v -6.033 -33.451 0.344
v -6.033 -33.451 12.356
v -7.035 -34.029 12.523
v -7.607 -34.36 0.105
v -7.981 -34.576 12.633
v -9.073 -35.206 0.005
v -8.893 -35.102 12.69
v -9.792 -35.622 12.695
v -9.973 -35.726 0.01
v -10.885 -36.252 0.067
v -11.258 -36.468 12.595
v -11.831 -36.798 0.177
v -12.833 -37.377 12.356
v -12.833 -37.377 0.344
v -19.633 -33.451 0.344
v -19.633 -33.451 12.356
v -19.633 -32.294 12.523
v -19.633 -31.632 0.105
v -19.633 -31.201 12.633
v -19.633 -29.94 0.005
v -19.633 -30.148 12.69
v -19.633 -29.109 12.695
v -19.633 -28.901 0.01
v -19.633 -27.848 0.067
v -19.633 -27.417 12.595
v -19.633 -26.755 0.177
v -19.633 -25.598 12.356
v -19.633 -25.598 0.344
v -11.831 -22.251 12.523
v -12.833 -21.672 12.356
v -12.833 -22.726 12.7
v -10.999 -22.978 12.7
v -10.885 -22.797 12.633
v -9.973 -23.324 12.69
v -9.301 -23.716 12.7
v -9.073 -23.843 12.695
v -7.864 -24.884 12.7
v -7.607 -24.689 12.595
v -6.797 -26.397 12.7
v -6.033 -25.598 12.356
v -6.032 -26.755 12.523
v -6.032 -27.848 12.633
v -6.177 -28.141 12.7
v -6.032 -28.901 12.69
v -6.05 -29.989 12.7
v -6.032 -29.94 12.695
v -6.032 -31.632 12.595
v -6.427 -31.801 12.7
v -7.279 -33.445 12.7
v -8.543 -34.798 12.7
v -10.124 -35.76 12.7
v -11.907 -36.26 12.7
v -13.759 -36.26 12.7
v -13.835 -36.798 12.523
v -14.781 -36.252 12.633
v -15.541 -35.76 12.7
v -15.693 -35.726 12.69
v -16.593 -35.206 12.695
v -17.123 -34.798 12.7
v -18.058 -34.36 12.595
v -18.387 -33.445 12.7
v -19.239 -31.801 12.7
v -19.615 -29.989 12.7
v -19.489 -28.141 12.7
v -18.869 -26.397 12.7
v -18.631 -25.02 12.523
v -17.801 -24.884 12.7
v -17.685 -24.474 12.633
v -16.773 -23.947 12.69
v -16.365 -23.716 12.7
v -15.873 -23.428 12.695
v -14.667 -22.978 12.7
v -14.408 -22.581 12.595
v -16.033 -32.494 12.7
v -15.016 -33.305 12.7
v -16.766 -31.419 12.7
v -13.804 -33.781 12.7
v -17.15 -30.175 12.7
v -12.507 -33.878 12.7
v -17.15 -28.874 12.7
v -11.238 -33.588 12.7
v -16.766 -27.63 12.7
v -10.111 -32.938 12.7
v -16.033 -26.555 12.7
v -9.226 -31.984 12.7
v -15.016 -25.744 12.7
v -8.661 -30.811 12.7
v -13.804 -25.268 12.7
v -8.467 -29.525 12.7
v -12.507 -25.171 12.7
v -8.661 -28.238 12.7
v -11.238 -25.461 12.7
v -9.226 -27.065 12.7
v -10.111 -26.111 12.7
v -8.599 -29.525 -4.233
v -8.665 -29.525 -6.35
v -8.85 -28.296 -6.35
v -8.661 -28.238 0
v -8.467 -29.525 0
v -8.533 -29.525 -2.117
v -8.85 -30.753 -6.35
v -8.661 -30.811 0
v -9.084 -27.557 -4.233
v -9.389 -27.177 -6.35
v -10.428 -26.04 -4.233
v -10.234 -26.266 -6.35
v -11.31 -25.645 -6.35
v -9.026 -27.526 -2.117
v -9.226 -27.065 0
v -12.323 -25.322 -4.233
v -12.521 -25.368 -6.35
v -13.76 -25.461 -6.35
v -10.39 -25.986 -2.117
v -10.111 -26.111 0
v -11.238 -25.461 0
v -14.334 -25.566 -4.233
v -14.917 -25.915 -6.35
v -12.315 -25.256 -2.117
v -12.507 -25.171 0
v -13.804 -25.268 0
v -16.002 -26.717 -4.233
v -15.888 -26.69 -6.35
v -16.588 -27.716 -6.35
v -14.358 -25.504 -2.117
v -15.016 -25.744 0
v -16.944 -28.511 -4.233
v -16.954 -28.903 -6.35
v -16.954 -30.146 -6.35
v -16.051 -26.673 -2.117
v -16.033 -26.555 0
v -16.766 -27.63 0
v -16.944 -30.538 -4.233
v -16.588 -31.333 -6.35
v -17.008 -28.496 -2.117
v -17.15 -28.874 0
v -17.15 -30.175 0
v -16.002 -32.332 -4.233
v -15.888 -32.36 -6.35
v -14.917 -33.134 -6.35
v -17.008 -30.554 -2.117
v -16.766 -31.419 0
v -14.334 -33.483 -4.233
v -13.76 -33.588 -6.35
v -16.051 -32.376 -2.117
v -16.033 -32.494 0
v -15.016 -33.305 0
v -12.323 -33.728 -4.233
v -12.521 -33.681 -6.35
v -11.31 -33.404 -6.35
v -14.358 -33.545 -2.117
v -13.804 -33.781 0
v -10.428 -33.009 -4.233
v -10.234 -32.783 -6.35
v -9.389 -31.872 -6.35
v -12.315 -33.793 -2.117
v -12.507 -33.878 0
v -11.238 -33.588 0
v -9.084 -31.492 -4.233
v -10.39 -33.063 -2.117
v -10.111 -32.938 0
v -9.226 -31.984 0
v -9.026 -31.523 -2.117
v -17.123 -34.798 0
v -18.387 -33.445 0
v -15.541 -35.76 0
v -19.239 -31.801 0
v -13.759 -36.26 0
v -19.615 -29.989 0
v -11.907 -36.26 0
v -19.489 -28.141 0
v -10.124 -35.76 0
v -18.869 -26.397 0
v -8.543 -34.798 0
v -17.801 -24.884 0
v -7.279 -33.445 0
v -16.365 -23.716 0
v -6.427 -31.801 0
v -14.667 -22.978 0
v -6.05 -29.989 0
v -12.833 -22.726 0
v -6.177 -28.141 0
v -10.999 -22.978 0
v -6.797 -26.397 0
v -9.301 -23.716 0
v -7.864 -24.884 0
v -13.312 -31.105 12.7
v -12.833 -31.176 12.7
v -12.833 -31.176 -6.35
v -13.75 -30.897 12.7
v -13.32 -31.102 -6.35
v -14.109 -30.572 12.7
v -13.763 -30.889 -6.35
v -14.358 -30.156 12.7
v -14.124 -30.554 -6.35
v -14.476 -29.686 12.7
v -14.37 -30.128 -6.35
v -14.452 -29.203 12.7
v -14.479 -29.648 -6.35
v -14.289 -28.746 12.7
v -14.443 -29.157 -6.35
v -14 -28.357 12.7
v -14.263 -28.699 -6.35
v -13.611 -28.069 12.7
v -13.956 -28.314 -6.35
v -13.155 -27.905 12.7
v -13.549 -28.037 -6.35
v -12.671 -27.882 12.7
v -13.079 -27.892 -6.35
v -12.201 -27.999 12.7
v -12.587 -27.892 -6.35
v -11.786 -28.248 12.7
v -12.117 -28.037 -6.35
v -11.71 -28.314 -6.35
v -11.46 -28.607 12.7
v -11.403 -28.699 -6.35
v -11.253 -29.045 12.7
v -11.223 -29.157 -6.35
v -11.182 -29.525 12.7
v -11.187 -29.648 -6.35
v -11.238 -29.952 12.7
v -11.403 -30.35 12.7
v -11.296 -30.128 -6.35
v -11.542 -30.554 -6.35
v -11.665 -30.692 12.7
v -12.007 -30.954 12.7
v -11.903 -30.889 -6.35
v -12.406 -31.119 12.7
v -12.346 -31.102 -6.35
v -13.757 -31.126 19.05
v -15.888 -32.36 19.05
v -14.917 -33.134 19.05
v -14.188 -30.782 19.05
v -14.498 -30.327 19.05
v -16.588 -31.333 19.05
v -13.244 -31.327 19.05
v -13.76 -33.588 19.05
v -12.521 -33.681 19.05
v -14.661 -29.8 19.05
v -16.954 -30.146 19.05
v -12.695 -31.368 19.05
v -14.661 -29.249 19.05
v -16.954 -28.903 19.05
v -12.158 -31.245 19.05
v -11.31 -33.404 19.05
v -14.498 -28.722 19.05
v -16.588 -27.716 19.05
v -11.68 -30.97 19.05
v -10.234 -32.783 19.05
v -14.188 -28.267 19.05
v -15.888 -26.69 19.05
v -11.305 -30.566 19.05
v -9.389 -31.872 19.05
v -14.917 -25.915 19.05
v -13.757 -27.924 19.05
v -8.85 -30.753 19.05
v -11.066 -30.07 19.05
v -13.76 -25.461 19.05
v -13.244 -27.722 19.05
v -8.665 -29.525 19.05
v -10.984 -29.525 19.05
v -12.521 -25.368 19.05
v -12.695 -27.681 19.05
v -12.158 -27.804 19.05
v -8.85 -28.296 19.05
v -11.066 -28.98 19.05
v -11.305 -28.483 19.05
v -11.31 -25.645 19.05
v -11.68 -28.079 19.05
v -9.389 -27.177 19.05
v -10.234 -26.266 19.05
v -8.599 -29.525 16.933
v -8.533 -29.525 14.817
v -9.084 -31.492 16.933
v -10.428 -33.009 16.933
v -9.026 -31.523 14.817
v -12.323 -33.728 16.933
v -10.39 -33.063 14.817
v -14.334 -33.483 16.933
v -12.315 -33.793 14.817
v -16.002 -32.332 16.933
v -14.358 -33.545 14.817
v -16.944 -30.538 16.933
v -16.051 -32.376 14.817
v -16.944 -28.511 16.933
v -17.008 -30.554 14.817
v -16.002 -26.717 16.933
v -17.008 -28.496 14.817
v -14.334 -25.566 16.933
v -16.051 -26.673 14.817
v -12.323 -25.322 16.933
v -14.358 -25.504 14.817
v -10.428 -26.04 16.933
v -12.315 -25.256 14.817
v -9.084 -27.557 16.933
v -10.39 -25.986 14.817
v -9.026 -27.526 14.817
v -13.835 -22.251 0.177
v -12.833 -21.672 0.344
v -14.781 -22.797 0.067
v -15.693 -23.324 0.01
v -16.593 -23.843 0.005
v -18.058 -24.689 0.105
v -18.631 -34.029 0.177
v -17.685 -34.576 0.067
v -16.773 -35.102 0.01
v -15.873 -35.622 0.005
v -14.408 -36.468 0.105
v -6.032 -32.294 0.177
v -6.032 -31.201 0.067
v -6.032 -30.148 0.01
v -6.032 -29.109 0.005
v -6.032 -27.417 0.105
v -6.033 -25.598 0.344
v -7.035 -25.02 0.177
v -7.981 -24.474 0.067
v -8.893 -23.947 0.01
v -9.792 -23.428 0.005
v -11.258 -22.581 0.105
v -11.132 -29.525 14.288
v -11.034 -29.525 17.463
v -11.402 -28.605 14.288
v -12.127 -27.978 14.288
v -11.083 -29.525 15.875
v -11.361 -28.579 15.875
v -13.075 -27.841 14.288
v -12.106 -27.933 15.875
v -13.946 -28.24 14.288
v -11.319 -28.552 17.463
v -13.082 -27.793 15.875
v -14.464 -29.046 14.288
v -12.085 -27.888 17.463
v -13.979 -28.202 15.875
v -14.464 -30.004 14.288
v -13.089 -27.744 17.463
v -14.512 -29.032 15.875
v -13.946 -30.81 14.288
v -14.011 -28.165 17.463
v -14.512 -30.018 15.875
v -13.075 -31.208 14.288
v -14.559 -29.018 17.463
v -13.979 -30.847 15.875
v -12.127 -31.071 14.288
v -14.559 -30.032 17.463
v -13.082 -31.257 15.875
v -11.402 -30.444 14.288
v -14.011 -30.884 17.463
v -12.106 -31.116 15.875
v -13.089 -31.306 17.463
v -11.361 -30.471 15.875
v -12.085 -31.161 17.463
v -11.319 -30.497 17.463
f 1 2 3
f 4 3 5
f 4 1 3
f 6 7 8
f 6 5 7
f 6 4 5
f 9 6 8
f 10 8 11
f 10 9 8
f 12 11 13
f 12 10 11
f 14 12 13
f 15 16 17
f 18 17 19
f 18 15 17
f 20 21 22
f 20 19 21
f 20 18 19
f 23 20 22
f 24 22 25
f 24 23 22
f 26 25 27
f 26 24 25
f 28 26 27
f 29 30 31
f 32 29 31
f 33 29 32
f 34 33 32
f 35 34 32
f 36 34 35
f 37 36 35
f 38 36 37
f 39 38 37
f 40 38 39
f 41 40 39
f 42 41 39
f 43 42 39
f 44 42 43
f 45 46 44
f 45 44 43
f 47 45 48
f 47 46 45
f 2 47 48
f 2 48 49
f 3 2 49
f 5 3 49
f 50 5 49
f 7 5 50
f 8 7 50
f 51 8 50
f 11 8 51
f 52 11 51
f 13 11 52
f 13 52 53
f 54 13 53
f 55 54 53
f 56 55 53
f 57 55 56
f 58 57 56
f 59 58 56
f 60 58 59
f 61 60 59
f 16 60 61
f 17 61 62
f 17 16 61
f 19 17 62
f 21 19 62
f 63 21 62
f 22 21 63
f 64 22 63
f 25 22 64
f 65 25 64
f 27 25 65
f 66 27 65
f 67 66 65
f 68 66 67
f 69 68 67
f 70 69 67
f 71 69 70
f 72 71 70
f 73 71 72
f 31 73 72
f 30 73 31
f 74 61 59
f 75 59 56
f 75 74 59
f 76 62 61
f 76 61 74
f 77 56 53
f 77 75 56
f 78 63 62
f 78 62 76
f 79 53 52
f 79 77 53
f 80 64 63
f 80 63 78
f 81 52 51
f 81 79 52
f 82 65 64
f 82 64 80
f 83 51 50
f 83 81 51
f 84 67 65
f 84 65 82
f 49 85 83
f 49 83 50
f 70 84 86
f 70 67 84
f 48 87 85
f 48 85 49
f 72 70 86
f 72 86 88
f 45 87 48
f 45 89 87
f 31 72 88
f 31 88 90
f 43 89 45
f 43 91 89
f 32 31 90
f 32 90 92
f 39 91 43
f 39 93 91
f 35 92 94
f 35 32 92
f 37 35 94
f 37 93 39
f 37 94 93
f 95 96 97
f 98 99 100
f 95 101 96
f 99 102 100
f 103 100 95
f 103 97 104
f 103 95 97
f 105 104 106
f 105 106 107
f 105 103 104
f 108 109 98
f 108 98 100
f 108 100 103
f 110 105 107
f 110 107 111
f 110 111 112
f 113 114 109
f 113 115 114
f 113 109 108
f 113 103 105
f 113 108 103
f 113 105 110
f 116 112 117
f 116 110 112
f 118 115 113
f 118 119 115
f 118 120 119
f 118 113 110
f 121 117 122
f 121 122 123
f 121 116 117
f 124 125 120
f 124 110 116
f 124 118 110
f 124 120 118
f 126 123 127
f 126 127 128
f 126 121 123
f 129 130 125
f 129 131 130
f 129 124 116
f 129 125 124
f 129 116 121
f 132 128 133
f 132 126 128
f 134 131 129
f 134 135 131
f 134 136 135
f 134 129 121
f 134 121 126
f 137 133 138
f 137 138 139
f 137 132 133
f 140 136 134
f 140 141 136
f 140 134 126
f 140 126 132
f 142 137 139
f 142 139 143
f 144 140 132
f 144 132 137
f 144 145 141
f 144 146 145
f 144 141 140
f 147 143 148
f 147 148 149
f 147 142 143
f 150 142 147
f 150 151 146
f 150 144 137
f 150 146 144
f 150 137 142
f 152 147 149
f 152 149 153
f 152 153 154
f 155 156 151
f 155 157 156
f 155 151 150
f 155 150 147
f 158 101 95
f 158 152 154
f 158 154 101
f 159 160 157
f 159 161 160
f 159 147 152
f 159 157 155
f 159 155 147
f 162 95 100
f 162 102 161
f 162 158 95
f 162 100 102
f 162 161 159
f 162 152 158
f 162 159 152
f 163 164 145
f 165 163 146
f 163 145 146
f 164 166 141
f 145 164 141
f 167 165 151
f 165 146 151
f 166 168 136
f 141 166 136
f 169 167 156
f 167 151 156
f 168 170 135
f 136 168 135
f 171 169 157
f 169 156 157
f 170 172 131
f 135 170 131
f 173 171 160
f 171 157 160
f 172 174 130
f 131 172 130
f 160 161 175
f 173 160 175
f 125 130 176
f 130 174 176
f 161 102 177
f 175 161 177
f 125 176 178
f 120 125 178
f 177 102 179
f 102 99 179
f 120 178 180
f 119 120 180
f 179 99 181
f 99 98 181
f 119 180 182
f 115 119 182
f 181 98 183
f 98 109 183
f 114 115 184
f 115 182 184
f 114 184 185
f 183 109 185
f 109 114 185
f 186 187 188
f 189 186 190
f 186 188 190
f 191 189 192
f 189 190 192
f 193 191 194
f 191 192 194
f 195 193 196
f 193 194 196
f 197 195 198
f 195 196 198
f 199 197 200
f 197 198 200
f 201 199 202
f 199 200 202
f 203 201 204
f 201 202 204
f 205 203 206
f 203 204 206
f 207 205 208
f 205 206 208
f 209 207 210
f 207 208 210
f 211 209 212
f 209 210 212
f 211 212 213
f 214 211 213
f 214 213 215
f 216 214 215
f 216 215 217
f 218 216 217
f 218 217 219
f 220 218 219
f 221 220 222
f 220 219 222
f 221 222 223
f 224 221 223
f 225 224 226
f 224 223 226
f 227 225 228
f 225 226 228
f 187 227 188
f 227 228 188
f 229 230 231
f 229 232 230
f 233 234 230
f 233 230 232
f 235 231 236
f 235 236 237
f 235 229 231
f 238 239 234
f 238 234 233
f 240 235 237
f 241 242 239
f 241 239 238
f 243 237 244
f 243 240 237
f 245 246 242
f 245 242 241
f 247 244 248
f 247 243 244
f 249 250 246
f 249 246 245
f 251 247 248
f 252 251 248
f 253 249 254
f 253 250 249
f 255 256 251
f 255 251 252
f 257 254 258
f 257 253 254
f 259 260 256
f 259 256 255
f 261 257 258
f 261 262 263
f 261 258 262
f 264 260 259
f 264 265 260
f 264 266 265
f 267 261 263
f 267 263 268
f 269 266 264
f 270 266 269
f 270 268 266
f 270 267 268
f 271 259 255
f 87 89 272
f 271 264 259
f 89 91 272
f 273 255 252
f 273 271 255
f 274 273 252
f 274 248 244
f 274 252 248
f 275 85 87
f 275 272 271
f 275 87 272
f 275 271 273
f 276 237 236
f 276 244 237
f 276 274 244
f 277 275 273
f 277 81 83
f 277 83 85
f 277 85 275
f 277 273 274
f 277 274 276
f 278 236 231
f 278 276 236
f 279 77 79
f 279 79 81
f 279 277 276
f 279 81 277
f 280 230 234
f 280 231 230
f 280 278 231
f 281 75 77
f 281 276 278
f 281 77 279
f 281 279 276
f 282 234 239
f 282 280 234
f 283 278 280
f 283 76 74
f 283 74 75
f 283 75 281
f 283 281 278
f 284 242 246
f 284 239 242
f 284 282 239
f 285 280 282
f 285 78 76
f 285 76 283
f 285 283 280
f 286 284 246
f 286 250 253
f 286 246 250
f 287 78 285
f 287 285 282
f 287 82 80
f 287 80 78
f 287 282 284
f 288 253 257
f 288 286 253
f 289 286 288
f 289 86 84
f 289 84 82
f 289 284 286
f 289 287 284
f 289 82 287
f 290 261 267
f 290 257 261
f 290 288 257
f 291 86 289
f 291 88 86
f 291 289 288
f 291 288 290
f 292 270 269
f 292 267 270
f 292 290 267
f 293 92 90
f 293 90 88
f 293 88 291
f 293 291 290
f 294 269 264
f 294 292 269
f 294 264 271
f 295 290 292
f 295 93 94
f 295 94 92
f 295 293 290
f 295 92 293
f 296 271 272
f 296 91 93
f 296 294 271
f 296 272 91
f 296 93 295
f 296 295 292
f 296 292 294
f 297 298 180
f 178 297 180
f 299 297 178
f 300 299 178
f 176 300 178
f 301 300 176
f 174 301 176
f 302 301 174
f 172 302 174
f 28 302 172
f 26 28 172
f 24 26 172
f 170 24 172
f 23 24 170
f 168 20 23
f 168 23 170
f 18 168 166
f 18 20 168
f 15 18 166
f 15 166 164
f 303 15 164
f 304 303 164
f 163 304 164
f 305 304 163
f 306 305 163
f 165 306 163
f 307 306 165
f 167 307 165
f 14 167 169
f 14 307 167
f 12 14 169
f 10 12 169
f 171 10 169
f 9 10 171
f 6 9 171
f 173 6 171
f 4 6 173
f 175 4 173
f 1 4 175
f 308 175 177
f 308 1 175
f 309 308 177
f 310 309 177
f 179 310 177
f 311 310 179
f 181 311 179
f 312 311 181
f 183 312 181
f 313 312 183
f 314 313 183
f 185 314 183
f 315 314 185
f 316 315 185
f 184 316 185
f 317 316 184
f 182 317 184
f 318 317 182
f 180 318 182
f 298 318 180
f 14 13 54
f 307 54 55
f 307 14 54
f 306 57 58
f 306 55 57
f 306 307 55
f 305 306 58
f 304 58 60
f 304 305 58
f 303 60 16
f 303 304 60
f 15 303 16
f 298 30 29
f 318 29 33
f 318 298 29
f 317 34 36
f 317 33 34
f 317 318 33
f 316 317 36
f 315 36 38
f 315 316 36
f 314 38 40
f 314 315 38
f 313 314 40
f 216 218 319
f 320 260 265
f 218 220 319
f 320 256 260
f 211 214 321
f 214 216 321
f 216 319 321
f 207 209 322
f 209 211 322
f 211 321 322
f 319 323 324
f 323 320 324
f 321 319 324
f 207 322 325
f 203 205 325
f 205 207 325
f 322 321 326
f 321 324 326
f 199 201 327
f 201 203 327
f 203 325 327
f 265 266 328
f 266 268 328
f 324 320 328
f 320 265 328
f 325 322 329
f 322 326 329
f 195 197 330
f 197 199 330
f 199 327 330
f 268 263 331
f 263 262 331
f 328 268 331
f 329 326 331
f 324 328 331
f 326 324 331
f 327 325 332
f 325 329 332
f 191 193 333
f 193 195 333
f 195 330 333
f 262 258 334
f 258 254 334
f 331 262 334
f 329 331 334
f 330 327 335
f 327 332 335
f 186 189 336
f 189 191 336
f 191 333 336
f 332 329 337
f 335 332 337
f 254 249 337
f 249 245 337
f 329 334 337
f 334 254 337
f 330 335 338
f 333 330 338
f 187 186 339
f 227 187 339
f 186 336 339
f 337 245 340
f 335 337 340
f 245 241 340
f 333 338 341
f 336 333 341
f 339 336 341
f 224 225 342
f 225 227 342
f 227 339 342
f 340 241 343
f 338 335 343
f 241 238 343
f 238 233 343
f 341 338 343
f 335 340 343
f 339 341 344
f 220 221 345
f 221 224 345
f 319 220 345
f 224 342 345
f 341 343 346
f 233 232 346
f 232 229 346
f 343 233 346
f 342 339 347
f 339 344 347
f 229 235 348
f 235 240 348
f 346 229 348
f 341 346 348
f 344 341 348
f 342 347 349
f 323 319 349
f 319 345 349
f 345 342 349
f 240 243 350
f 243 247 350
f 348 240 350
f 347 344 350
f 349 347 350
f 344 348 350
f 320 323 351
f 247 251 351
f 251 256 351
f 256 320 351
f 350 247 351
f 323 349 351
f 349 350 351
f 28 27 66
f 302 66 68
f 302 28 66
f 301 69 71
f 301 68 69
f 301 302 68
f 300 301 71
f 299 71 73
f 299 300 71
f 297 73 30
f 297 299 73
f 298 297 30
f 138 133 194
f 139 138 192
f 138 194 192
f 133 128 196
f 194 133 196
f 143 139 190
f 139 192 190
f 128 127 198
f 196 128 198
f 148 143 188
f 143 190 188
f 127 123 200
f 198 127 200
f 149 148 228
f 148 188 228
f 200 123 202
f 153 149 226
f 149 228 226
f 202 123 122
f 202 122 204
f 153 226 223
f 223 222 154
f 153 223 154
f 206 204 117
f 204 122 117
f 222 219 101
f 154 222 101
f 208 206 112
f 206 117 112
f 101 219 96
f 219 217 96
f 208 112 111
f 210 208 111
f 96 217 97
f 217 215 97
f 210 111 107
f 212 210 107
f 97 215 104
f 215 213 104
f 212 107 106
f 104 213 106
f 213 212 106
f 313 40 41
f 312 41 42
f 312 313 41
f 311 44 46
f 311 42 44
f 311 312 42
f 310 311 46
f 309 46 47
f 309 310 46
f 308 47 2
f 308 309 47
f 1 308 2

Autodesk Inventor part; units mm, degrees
ref_plane "YZ Plane" through (0, 0, 0) normal (1, 0, 0) x (0, 1, 0)
sketch "Sketch1" plane through (0, 0, 0) normal (0, 0, 1) x (1, 0, 0)
  circle A0 centre (-12.8329, -29.5246) radius 6.35
  line L0 (-6.0325, -33.4508) -> (-12.8329, -37.377)
  line L1 (-12.8329, -37.377) -> (-19.6333, -33.4508)
  line L2 (-19.6333, -33.4508) -> (-19.6333, -25.5984)
  line L3 (-19.6333, -25.5984) -> (-12.8329, -21.6722)
  line L4 (-12.8329, -21.6722) -> (-6.0325, -25.5984)
  line L5 (-6.0325, -25.5984) -> (-6.0325, -33.4508)
  circle A1 centre (-12.8329, -29.5246) radius 4.3656
  circle A2 centre (-12.8329, -29.5246) radius 6.35
  circle A3 centre (-12.8329, -29.5246) radius 6.8004
  line L6 (-12.8329, -21.6722) -> (-12.8329, -22.7242) construction
  dimension "d36" = 13.6008
  dimension "d37" = 1.052
extrude "Extrusion1" add sketch "Sketch1" along normal blind 12.7 contours A0 | L0 A3 L5 | L0 L1 A3 | A3 | A3 L4 L5 | L1 L2 A3 | A3 L3 L4 | L2 L3 A3 | A1
ref_plane "Work Plane1" through (-12.8329, -37.377, 0) normal (-1, 0, 0) x (0, 0, 1)
extrude "Extrusion3" add sketch "Sketch1" against normal blind 6.35 draft -1.783 contours A1
thread "Thread2" size "1/8" designation "1/8 - 27 NPT" standard "NPT for PVC Pipe and Fitting" length 9.9568
sketch "Sketch6" plane through (0, 0, 12.7) normal (0, 0, 1) x (1, 0, 0)
  circle A0 centre (-12.8329, -29.5246) radius 6.35 projected
  point P0 (0, 0)
hole "Hole2" at (-12.8329, -29.5246, 12.7) direction (0, 0, -1) diameter 3.302 end through all
sketch "Sketch7" plane through (0, 0, 12.7) normal (0, 0, 1) x (1, 0, 0)
  circle A0 centre (-12.8329, -29.5246) radius 1.651 projected
  circle A1 centre (-12.8329, -29.5246) radius 4.3656 projected
  point P0 (0, 0)
extrude "Extrusion4" add sketch "Sketch7" along normal blind 6.35 draft -1.783
thread "Thread3" size "1/8" designation "1/8 - 27 NPT" standard "NPT for PVC Pipe and Fitting" length 9.9568
sketch "Sketch8" plane through (-12.8329, -37.377, 0) normal (-1, 0, 0) x (0, 0, 1)
  line L0 (12.7, 14.6507) -> (12.3564, 15.7048)
  line L1 (12.3564, 15.7048) -> (12.7, 14.6507)
  line L2 (12.3564, 15.7048) -> (12.7, 15.7048)
  line L3 (12.7, 15.7048) -> (12.7, 14.6507)
  line L4 (12.7, 15.7048) -> (12.7, 11.7786) projected
  line L5 (16.6116, 7.8524) -> (-10.7696, 7.8524) projected
  point P0 (0, 37.377)
  point P1 (-6.858, -1.905)
  dimension "d38" = 1.0541
revolve "Revolution3" cut sketch "Sketch8" angle 360 about axis through (-12.8329, -29.5246, 0) along (0, 0, -1)
ref_plane "Work Plane4" through (-12.8329, -29.5246, 6.35) normal (0, 0, 1) x (1, 0, 0)
mirror "Mirror4" about plane through (-12.8329, -29.5246, 6.35) normal (0, 0, 1) of "Revolution3"
properties part number "Pneumatic_VIAIR_Fitting"
